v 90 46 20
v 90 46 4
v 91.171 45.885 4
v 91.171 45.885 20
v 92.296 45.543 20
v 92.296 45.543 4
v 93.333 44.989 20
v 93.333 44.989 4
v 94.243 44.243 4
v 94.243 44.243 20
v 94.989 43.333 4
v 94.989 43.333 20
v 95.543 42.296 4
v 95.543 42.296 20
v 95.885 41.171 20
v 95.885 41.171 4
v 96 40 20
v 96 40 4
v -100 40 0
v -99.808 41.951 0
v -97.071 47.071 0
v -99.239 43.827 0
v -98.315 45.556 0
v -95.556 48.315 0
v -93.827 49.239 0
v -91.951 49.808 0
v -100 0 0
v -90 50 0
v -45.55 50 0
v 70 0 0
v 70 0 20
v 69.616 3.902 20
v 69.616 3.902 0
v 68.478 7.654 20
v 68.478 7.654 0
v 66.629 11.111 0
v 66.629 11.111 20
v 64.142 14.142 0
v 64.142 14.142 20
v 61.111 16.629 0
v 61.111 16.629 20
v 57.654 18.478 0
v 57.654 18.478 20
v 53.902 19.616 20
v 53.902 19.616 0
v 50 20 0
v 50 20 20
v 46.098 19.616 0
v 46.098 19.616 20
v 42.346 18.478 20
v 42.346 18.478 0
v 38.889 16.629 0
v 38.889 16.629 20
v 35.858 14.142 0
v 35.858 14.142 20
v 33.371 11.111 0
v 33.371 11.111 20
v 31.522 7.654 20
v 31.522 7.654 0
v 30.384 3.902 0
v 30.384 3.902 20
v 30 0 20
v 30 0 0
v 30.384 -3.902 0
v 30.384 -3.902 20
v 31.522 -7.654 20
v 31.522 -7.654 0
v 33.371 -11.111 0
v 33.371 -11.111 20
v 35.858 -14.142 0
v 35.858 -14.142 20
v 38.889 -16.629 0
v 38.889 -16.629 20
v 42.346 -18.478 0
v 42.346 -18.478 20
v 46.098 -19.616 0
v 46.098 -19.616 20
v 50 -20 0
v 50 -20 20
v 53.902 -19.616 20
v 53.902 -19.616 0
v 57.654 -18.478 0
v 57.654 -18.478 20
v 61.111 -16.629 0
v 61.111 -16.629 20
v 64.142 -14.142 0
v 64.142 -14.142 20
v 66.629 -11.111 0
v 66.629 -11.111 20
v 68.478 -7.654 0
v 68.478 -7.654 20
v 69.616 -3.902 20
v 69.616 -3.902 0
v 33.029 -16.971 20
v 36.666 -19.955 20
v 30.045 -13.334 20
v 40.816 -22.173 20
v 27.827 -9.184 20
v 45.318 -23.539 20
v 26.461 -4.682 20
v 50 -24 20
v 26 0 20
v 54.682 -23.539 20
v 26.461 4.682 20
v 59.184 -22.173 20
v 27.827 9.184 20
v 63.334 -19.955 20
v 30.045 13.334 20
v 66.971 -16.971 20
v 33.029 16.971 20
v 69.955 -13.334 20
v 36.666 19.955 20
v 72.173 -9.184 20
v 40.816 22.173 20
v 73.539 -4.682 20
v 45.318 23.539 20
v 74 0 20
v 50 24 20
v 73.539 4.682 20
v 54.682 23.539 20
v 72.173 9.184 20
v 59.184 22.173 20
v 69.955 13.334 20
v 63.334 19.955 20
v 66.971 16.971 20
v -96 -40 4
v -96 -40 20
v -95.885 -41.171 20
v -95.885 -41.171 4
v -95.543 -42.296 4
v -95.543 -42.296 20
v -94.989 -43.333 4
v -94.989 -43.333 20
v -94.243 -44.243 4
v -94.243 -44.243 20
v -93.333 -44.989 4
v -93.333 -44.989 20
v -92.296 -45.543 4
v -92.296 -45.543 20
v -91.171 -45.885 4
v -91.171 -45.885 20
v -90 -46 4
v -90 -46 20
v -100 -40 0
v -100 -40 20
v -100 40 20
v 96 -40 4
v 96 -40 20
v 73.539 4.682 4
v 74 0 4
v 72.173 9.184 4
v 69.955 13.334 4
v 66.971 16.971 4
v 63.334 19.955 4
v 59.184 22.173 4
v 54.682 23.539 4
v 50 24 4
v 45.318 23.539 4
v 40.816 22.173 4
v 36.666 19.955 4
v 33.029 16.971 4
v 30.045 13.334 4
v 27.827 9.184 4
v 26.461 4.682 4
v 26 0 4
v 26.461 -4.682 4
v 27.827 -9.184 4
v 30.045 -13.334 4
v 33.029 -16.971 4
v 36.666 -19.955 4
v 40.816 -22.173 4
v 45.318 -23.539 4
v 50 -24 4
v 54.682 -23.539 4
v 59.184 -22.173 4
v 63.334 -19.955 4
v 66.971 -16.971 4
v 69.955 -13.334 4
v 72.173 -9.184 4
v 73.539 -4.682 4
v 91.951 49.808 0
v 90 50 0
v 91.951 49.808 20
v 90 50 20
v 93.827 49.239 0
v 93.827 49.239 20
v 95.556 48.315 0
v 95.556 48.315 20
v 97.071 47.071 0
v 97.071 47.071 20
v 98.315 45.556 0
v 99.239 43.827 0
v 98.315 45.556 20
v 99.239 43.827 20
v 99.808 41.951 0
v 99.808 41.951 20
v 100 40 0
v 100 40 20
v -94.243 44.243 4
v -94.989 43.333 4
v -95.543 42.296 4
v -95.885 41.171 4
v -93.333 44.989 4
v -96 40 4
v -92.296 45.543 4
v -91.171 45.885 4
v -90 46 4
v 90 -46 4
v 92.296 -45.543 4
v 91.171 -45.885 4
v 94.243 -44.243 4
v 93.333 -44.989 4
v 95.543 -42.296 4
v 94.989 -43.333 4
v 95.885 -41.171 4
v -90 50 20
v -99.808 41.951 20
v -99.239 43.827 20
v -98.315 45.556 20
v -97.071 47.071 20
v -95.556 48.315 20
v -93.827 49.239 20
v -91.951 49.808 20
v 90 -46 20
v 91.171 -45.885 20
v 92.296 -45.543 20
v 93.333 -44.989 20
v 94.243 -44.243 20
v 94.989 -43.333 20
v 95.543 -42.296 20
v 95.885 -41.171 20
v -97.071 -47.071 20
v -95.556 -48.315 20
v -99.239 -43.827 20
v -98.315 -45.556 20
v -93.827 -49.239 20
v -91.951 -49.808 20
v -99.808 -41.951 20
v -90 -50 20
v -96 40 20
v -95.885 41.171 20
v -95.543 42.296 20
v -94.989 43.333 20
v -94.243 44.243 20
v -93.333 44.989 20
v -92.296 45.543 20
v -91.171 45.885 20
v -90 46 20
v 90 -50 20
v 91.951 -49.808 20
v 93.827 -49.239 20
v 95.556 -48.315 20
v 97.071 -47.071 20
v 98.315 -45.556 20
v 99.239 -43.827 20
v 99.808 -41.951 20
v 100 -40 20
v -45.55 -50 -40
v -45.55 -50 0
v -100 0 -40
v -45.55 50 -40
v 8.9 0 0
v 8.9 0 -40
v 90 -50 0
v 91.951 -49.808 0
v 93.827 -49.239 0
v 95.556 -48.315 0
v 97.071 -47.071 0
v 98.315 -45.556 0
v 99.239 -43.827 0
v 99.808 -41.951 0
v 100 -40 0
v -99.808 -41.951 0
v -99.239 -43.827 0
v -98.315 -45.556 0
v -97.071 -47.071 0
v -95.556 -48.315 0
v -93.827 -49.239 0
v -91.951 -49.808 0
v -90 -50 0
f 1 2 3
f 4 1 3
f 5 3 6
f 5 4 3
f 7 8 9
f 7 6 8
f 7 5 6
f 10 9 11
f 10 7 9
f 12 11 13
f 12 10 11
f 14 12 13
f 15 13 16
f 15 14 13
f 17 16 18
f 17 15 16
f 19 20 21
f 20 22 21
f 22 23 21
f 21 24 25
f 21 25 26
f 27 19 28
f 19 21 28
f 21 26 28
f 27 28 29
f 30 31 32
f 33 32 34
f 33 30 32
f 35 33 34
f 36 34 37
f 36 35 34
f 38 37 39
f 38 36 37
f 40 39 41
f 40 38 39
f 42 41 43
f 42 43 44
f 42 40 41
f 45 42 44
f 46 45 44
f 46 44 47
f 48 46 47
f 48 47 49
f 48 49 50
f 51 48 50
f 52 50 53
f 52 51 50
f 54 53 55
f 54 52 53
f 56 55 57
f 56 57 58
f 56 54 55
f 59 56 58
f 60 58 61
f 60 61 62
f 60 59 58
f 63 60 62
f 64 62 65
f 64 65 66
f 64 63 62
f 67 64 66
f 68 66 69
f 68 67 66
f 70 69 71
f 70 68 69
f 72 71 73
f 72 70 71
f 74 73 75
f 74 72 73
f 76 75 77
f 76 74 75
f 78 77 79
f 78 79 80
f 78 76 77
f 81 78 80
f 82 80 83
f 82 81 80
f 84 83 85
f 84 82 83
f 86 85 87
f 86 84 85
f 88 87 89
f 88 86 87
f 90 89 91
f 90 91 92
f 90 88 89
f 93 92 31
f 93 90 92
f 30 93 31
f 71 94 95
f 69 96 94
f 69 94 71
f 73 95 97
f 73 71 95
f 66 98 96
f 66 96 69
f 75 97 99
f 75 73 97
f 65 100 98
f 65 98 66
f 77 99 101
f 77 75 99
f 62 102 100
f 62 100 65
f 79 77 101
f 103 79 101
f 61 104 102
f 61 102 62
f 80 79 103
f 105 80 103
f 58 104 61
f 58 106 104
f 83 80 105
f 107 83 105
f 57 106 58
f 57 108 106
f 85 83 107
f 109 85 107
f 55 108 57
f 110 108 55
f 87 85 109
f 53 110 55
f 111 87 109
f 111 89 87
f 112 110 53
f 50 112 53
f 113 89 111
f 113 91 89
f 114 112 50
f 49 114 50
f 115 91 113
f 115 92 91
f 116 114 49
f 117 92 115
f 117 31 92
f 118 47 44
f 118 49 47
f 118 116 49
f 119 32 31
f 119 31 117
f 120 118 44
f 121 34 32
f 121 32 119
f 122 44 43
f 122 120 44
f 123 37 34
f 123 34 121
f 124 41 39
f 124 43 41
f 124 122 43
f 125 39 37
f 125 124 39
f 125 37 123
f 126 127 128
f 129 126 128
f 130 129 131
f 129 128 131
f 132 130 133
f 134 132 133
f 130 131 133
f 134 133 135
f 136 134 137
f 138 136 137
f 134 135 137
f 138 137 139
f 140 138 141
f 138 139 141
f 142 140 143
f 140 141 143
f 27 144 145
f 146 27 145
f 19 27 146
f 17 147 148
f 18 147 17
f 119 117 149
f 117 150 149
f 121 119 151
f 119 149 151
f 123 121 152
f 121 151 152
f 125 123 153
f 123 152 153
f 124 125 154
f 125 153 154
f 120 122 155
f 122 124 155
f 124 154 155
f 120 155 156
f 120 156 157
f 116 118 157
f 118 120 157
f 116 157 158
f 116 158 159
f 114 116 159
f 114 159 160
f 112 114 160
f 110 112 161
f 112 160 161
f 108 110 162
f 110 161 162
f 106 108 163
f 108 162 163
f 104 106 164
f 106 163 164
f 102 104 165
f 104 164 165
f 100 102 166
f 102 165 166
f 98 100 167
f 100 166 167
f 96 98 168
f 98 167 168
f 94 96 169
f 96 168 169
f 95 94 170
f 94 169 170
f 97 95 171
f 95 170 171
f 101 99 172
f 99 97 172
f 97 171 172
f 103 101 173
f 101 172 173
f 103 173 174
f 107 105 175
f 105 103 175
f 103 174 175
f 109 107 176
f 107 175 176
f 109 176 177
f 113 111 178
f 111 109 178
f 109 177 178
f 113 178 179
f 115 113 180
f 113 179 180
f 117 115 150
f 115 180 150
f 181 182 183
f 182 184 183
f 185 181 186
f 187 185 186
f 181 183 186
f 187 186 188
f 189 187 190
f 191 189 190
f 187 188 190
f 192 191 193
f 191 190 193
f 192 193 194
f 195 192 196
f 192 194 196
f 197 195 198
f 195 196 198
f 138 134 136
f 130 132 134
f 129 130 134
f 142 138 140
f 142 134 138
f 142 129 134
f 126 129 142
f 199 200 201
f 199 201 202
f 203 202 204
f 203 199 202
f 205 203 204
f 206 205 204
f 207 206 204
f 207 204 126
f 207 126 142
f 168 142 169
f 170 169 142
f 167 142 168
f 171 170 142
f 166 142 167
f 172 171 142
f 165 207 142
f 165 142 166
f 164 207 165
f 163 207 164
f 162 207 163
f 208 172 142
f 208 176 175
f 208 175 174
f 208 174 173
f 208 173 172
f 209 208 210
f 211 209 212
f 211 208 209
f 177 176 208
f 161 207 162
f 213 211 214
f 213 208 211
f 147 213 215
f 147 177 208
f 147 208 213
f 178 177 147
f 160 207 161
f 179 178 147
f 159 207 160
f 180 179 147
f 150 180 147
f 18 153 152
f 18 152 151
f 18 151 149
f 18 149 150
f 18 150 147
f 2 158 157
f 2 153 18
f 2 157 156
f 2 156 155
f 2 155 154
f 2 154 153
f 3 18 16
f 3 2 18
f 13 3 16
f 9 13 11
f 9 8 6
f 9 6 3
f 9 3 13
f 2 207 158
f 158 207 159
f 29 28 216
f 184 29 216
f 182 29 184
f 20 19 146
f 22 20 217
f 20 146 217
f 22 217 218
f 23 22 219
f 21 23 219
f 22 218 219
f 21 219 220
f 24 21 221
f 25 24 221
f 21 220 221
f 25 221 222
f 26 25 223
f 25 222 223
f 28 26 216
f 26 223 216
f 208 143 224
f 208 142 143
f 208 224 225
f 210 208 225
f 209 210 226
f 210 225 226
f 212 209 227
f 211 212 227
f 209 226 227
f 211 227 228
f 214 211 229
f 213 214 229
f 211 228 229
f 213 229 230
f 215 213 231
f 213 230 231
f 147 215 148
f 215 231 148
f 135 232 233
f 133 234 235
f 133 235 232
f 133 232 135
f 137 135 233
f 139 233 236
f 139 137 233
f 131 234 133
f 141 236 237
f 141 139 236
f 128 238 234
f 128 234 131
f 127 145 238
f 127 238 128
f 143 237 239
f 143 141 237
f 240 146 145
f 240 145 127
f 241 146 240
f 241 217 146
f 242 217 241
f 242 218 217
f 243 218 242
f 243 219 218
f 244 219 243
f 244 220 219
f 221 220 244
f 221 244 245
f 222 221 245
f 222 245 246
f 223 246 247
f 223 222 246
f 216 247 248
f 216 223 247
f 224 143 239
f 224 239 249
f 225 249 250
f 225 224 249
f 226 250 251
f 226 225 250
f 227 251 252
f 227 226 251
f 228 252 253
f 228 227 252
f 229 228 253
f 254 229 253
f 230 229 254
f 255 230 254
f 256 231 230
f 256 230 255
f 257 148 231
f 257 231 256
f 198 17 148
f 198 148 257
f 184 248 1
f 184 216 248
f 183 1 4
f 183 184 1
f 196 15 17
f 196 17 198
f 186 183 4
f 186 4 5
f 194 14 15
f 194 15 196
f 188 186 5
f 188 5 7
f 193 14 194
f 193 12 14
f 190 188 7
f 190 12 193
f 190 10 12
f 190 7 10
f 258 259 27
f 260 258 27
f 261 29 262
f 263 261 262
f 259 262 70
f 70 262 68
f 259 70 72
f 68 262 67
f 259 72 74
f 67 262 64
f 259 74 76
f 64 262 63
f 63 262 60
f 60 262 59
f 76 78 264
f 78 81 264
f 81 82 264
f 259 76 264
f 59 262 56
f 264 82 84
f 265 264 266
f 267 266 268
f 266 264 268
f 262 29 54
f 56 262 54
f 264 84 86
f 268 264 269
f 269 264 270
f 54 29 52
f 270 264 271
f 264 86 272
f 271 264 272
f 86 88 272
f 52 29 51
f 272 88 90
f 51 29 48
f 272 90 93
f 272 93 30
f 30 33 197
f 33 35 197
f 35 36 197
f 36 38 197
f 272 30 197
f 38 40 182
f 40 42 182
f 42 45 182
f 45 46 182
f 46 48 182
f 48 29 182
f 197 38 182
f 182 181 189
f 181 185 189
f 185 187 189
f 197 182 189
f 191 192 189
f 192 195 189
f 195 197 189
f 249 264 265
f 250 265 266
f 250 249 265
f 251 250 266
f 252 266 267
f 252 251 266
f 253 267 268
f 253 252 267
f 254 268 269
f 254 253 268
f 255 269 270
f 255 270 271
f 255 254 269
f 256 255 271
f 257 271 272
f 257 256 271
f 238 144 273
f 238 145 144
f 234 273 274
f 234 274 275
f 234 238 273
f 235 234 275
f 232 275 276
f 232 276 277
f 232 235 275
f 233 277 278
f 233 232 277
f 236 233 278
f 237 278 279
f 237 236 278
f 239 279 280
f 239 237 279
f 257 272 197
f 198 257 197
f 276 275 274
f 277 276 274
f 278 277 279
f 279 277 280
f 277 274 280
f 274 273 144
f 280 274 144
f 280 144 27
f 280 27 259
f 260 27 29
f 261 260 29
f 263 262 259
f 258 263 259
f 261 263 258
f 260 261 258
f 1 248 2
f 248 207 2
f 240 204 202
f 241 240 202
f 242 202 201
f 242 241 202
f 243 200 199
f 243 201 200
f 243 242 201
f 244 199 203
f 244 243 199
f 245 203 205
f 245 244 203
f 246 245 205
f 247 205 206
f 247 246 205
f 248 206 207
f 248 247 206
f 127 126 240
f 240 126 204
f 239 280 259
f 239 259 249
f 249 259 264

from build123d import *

# Parameters (mm, degrees)
SKICA1_W                = 200
SKICA1_H                = 100
SKICA1_R                = 20
P_IDAT_VYSUNUT_M1_DEPTH = 20
ZAOBLIT1_R              = 10
SKO_EPINA1_T            = -4
P_IDAT_VYSUNUT_M2_DEPTH = 40


with BuildPart() as part:
    # Skica1 → Přidat vysunutím1 (new body)
    with BuildSketch(Plane.XY):
        Rectangle(SKICA1_W, SKICA1_H)
        with Locations((50, 0)):
            Circle(SKICA1_R, mode=Mode.SUBTRACT)
    extrude(amount=P_IDAT_VYSUNUT_M1_DEPTH)

    # Zaoblit1
    zaoblit1_edges = [part.edges().sort_by_distance(p)[0] for p in [
        (-100, 50, 10),
        (100, 50, 10),
        (100, -50, 10),
        (-100, -50, 10),
    ]]
    fillet(zaoblit1_edges, radius=ZAOBLIT1_R)

    # Skořepina1
    sko_epina1_openings = [part.faces().sort_by_distance(p)[0] for p in [
        (0, 0, 20),
    ]]
    offset(amount=SKO_EPINA1_T, openings=sko_epina1_openings, kind=Kind.INTERSECTION)

    # Skica2 → Přidat vysunutím2 (add)
    with BuildSketch(Plane(origin=(0, 0, 0), x_dir=(-1, 0, 0), z_dir=(0, 0, -1))):
        Polygon((45.55, -50), (100, 0), (45.55, 50), (-8.9, 0), align=None)
    extrude(amount=P_IDAT_VYSUNUT_M2_DEPTH)


solid = part.part
